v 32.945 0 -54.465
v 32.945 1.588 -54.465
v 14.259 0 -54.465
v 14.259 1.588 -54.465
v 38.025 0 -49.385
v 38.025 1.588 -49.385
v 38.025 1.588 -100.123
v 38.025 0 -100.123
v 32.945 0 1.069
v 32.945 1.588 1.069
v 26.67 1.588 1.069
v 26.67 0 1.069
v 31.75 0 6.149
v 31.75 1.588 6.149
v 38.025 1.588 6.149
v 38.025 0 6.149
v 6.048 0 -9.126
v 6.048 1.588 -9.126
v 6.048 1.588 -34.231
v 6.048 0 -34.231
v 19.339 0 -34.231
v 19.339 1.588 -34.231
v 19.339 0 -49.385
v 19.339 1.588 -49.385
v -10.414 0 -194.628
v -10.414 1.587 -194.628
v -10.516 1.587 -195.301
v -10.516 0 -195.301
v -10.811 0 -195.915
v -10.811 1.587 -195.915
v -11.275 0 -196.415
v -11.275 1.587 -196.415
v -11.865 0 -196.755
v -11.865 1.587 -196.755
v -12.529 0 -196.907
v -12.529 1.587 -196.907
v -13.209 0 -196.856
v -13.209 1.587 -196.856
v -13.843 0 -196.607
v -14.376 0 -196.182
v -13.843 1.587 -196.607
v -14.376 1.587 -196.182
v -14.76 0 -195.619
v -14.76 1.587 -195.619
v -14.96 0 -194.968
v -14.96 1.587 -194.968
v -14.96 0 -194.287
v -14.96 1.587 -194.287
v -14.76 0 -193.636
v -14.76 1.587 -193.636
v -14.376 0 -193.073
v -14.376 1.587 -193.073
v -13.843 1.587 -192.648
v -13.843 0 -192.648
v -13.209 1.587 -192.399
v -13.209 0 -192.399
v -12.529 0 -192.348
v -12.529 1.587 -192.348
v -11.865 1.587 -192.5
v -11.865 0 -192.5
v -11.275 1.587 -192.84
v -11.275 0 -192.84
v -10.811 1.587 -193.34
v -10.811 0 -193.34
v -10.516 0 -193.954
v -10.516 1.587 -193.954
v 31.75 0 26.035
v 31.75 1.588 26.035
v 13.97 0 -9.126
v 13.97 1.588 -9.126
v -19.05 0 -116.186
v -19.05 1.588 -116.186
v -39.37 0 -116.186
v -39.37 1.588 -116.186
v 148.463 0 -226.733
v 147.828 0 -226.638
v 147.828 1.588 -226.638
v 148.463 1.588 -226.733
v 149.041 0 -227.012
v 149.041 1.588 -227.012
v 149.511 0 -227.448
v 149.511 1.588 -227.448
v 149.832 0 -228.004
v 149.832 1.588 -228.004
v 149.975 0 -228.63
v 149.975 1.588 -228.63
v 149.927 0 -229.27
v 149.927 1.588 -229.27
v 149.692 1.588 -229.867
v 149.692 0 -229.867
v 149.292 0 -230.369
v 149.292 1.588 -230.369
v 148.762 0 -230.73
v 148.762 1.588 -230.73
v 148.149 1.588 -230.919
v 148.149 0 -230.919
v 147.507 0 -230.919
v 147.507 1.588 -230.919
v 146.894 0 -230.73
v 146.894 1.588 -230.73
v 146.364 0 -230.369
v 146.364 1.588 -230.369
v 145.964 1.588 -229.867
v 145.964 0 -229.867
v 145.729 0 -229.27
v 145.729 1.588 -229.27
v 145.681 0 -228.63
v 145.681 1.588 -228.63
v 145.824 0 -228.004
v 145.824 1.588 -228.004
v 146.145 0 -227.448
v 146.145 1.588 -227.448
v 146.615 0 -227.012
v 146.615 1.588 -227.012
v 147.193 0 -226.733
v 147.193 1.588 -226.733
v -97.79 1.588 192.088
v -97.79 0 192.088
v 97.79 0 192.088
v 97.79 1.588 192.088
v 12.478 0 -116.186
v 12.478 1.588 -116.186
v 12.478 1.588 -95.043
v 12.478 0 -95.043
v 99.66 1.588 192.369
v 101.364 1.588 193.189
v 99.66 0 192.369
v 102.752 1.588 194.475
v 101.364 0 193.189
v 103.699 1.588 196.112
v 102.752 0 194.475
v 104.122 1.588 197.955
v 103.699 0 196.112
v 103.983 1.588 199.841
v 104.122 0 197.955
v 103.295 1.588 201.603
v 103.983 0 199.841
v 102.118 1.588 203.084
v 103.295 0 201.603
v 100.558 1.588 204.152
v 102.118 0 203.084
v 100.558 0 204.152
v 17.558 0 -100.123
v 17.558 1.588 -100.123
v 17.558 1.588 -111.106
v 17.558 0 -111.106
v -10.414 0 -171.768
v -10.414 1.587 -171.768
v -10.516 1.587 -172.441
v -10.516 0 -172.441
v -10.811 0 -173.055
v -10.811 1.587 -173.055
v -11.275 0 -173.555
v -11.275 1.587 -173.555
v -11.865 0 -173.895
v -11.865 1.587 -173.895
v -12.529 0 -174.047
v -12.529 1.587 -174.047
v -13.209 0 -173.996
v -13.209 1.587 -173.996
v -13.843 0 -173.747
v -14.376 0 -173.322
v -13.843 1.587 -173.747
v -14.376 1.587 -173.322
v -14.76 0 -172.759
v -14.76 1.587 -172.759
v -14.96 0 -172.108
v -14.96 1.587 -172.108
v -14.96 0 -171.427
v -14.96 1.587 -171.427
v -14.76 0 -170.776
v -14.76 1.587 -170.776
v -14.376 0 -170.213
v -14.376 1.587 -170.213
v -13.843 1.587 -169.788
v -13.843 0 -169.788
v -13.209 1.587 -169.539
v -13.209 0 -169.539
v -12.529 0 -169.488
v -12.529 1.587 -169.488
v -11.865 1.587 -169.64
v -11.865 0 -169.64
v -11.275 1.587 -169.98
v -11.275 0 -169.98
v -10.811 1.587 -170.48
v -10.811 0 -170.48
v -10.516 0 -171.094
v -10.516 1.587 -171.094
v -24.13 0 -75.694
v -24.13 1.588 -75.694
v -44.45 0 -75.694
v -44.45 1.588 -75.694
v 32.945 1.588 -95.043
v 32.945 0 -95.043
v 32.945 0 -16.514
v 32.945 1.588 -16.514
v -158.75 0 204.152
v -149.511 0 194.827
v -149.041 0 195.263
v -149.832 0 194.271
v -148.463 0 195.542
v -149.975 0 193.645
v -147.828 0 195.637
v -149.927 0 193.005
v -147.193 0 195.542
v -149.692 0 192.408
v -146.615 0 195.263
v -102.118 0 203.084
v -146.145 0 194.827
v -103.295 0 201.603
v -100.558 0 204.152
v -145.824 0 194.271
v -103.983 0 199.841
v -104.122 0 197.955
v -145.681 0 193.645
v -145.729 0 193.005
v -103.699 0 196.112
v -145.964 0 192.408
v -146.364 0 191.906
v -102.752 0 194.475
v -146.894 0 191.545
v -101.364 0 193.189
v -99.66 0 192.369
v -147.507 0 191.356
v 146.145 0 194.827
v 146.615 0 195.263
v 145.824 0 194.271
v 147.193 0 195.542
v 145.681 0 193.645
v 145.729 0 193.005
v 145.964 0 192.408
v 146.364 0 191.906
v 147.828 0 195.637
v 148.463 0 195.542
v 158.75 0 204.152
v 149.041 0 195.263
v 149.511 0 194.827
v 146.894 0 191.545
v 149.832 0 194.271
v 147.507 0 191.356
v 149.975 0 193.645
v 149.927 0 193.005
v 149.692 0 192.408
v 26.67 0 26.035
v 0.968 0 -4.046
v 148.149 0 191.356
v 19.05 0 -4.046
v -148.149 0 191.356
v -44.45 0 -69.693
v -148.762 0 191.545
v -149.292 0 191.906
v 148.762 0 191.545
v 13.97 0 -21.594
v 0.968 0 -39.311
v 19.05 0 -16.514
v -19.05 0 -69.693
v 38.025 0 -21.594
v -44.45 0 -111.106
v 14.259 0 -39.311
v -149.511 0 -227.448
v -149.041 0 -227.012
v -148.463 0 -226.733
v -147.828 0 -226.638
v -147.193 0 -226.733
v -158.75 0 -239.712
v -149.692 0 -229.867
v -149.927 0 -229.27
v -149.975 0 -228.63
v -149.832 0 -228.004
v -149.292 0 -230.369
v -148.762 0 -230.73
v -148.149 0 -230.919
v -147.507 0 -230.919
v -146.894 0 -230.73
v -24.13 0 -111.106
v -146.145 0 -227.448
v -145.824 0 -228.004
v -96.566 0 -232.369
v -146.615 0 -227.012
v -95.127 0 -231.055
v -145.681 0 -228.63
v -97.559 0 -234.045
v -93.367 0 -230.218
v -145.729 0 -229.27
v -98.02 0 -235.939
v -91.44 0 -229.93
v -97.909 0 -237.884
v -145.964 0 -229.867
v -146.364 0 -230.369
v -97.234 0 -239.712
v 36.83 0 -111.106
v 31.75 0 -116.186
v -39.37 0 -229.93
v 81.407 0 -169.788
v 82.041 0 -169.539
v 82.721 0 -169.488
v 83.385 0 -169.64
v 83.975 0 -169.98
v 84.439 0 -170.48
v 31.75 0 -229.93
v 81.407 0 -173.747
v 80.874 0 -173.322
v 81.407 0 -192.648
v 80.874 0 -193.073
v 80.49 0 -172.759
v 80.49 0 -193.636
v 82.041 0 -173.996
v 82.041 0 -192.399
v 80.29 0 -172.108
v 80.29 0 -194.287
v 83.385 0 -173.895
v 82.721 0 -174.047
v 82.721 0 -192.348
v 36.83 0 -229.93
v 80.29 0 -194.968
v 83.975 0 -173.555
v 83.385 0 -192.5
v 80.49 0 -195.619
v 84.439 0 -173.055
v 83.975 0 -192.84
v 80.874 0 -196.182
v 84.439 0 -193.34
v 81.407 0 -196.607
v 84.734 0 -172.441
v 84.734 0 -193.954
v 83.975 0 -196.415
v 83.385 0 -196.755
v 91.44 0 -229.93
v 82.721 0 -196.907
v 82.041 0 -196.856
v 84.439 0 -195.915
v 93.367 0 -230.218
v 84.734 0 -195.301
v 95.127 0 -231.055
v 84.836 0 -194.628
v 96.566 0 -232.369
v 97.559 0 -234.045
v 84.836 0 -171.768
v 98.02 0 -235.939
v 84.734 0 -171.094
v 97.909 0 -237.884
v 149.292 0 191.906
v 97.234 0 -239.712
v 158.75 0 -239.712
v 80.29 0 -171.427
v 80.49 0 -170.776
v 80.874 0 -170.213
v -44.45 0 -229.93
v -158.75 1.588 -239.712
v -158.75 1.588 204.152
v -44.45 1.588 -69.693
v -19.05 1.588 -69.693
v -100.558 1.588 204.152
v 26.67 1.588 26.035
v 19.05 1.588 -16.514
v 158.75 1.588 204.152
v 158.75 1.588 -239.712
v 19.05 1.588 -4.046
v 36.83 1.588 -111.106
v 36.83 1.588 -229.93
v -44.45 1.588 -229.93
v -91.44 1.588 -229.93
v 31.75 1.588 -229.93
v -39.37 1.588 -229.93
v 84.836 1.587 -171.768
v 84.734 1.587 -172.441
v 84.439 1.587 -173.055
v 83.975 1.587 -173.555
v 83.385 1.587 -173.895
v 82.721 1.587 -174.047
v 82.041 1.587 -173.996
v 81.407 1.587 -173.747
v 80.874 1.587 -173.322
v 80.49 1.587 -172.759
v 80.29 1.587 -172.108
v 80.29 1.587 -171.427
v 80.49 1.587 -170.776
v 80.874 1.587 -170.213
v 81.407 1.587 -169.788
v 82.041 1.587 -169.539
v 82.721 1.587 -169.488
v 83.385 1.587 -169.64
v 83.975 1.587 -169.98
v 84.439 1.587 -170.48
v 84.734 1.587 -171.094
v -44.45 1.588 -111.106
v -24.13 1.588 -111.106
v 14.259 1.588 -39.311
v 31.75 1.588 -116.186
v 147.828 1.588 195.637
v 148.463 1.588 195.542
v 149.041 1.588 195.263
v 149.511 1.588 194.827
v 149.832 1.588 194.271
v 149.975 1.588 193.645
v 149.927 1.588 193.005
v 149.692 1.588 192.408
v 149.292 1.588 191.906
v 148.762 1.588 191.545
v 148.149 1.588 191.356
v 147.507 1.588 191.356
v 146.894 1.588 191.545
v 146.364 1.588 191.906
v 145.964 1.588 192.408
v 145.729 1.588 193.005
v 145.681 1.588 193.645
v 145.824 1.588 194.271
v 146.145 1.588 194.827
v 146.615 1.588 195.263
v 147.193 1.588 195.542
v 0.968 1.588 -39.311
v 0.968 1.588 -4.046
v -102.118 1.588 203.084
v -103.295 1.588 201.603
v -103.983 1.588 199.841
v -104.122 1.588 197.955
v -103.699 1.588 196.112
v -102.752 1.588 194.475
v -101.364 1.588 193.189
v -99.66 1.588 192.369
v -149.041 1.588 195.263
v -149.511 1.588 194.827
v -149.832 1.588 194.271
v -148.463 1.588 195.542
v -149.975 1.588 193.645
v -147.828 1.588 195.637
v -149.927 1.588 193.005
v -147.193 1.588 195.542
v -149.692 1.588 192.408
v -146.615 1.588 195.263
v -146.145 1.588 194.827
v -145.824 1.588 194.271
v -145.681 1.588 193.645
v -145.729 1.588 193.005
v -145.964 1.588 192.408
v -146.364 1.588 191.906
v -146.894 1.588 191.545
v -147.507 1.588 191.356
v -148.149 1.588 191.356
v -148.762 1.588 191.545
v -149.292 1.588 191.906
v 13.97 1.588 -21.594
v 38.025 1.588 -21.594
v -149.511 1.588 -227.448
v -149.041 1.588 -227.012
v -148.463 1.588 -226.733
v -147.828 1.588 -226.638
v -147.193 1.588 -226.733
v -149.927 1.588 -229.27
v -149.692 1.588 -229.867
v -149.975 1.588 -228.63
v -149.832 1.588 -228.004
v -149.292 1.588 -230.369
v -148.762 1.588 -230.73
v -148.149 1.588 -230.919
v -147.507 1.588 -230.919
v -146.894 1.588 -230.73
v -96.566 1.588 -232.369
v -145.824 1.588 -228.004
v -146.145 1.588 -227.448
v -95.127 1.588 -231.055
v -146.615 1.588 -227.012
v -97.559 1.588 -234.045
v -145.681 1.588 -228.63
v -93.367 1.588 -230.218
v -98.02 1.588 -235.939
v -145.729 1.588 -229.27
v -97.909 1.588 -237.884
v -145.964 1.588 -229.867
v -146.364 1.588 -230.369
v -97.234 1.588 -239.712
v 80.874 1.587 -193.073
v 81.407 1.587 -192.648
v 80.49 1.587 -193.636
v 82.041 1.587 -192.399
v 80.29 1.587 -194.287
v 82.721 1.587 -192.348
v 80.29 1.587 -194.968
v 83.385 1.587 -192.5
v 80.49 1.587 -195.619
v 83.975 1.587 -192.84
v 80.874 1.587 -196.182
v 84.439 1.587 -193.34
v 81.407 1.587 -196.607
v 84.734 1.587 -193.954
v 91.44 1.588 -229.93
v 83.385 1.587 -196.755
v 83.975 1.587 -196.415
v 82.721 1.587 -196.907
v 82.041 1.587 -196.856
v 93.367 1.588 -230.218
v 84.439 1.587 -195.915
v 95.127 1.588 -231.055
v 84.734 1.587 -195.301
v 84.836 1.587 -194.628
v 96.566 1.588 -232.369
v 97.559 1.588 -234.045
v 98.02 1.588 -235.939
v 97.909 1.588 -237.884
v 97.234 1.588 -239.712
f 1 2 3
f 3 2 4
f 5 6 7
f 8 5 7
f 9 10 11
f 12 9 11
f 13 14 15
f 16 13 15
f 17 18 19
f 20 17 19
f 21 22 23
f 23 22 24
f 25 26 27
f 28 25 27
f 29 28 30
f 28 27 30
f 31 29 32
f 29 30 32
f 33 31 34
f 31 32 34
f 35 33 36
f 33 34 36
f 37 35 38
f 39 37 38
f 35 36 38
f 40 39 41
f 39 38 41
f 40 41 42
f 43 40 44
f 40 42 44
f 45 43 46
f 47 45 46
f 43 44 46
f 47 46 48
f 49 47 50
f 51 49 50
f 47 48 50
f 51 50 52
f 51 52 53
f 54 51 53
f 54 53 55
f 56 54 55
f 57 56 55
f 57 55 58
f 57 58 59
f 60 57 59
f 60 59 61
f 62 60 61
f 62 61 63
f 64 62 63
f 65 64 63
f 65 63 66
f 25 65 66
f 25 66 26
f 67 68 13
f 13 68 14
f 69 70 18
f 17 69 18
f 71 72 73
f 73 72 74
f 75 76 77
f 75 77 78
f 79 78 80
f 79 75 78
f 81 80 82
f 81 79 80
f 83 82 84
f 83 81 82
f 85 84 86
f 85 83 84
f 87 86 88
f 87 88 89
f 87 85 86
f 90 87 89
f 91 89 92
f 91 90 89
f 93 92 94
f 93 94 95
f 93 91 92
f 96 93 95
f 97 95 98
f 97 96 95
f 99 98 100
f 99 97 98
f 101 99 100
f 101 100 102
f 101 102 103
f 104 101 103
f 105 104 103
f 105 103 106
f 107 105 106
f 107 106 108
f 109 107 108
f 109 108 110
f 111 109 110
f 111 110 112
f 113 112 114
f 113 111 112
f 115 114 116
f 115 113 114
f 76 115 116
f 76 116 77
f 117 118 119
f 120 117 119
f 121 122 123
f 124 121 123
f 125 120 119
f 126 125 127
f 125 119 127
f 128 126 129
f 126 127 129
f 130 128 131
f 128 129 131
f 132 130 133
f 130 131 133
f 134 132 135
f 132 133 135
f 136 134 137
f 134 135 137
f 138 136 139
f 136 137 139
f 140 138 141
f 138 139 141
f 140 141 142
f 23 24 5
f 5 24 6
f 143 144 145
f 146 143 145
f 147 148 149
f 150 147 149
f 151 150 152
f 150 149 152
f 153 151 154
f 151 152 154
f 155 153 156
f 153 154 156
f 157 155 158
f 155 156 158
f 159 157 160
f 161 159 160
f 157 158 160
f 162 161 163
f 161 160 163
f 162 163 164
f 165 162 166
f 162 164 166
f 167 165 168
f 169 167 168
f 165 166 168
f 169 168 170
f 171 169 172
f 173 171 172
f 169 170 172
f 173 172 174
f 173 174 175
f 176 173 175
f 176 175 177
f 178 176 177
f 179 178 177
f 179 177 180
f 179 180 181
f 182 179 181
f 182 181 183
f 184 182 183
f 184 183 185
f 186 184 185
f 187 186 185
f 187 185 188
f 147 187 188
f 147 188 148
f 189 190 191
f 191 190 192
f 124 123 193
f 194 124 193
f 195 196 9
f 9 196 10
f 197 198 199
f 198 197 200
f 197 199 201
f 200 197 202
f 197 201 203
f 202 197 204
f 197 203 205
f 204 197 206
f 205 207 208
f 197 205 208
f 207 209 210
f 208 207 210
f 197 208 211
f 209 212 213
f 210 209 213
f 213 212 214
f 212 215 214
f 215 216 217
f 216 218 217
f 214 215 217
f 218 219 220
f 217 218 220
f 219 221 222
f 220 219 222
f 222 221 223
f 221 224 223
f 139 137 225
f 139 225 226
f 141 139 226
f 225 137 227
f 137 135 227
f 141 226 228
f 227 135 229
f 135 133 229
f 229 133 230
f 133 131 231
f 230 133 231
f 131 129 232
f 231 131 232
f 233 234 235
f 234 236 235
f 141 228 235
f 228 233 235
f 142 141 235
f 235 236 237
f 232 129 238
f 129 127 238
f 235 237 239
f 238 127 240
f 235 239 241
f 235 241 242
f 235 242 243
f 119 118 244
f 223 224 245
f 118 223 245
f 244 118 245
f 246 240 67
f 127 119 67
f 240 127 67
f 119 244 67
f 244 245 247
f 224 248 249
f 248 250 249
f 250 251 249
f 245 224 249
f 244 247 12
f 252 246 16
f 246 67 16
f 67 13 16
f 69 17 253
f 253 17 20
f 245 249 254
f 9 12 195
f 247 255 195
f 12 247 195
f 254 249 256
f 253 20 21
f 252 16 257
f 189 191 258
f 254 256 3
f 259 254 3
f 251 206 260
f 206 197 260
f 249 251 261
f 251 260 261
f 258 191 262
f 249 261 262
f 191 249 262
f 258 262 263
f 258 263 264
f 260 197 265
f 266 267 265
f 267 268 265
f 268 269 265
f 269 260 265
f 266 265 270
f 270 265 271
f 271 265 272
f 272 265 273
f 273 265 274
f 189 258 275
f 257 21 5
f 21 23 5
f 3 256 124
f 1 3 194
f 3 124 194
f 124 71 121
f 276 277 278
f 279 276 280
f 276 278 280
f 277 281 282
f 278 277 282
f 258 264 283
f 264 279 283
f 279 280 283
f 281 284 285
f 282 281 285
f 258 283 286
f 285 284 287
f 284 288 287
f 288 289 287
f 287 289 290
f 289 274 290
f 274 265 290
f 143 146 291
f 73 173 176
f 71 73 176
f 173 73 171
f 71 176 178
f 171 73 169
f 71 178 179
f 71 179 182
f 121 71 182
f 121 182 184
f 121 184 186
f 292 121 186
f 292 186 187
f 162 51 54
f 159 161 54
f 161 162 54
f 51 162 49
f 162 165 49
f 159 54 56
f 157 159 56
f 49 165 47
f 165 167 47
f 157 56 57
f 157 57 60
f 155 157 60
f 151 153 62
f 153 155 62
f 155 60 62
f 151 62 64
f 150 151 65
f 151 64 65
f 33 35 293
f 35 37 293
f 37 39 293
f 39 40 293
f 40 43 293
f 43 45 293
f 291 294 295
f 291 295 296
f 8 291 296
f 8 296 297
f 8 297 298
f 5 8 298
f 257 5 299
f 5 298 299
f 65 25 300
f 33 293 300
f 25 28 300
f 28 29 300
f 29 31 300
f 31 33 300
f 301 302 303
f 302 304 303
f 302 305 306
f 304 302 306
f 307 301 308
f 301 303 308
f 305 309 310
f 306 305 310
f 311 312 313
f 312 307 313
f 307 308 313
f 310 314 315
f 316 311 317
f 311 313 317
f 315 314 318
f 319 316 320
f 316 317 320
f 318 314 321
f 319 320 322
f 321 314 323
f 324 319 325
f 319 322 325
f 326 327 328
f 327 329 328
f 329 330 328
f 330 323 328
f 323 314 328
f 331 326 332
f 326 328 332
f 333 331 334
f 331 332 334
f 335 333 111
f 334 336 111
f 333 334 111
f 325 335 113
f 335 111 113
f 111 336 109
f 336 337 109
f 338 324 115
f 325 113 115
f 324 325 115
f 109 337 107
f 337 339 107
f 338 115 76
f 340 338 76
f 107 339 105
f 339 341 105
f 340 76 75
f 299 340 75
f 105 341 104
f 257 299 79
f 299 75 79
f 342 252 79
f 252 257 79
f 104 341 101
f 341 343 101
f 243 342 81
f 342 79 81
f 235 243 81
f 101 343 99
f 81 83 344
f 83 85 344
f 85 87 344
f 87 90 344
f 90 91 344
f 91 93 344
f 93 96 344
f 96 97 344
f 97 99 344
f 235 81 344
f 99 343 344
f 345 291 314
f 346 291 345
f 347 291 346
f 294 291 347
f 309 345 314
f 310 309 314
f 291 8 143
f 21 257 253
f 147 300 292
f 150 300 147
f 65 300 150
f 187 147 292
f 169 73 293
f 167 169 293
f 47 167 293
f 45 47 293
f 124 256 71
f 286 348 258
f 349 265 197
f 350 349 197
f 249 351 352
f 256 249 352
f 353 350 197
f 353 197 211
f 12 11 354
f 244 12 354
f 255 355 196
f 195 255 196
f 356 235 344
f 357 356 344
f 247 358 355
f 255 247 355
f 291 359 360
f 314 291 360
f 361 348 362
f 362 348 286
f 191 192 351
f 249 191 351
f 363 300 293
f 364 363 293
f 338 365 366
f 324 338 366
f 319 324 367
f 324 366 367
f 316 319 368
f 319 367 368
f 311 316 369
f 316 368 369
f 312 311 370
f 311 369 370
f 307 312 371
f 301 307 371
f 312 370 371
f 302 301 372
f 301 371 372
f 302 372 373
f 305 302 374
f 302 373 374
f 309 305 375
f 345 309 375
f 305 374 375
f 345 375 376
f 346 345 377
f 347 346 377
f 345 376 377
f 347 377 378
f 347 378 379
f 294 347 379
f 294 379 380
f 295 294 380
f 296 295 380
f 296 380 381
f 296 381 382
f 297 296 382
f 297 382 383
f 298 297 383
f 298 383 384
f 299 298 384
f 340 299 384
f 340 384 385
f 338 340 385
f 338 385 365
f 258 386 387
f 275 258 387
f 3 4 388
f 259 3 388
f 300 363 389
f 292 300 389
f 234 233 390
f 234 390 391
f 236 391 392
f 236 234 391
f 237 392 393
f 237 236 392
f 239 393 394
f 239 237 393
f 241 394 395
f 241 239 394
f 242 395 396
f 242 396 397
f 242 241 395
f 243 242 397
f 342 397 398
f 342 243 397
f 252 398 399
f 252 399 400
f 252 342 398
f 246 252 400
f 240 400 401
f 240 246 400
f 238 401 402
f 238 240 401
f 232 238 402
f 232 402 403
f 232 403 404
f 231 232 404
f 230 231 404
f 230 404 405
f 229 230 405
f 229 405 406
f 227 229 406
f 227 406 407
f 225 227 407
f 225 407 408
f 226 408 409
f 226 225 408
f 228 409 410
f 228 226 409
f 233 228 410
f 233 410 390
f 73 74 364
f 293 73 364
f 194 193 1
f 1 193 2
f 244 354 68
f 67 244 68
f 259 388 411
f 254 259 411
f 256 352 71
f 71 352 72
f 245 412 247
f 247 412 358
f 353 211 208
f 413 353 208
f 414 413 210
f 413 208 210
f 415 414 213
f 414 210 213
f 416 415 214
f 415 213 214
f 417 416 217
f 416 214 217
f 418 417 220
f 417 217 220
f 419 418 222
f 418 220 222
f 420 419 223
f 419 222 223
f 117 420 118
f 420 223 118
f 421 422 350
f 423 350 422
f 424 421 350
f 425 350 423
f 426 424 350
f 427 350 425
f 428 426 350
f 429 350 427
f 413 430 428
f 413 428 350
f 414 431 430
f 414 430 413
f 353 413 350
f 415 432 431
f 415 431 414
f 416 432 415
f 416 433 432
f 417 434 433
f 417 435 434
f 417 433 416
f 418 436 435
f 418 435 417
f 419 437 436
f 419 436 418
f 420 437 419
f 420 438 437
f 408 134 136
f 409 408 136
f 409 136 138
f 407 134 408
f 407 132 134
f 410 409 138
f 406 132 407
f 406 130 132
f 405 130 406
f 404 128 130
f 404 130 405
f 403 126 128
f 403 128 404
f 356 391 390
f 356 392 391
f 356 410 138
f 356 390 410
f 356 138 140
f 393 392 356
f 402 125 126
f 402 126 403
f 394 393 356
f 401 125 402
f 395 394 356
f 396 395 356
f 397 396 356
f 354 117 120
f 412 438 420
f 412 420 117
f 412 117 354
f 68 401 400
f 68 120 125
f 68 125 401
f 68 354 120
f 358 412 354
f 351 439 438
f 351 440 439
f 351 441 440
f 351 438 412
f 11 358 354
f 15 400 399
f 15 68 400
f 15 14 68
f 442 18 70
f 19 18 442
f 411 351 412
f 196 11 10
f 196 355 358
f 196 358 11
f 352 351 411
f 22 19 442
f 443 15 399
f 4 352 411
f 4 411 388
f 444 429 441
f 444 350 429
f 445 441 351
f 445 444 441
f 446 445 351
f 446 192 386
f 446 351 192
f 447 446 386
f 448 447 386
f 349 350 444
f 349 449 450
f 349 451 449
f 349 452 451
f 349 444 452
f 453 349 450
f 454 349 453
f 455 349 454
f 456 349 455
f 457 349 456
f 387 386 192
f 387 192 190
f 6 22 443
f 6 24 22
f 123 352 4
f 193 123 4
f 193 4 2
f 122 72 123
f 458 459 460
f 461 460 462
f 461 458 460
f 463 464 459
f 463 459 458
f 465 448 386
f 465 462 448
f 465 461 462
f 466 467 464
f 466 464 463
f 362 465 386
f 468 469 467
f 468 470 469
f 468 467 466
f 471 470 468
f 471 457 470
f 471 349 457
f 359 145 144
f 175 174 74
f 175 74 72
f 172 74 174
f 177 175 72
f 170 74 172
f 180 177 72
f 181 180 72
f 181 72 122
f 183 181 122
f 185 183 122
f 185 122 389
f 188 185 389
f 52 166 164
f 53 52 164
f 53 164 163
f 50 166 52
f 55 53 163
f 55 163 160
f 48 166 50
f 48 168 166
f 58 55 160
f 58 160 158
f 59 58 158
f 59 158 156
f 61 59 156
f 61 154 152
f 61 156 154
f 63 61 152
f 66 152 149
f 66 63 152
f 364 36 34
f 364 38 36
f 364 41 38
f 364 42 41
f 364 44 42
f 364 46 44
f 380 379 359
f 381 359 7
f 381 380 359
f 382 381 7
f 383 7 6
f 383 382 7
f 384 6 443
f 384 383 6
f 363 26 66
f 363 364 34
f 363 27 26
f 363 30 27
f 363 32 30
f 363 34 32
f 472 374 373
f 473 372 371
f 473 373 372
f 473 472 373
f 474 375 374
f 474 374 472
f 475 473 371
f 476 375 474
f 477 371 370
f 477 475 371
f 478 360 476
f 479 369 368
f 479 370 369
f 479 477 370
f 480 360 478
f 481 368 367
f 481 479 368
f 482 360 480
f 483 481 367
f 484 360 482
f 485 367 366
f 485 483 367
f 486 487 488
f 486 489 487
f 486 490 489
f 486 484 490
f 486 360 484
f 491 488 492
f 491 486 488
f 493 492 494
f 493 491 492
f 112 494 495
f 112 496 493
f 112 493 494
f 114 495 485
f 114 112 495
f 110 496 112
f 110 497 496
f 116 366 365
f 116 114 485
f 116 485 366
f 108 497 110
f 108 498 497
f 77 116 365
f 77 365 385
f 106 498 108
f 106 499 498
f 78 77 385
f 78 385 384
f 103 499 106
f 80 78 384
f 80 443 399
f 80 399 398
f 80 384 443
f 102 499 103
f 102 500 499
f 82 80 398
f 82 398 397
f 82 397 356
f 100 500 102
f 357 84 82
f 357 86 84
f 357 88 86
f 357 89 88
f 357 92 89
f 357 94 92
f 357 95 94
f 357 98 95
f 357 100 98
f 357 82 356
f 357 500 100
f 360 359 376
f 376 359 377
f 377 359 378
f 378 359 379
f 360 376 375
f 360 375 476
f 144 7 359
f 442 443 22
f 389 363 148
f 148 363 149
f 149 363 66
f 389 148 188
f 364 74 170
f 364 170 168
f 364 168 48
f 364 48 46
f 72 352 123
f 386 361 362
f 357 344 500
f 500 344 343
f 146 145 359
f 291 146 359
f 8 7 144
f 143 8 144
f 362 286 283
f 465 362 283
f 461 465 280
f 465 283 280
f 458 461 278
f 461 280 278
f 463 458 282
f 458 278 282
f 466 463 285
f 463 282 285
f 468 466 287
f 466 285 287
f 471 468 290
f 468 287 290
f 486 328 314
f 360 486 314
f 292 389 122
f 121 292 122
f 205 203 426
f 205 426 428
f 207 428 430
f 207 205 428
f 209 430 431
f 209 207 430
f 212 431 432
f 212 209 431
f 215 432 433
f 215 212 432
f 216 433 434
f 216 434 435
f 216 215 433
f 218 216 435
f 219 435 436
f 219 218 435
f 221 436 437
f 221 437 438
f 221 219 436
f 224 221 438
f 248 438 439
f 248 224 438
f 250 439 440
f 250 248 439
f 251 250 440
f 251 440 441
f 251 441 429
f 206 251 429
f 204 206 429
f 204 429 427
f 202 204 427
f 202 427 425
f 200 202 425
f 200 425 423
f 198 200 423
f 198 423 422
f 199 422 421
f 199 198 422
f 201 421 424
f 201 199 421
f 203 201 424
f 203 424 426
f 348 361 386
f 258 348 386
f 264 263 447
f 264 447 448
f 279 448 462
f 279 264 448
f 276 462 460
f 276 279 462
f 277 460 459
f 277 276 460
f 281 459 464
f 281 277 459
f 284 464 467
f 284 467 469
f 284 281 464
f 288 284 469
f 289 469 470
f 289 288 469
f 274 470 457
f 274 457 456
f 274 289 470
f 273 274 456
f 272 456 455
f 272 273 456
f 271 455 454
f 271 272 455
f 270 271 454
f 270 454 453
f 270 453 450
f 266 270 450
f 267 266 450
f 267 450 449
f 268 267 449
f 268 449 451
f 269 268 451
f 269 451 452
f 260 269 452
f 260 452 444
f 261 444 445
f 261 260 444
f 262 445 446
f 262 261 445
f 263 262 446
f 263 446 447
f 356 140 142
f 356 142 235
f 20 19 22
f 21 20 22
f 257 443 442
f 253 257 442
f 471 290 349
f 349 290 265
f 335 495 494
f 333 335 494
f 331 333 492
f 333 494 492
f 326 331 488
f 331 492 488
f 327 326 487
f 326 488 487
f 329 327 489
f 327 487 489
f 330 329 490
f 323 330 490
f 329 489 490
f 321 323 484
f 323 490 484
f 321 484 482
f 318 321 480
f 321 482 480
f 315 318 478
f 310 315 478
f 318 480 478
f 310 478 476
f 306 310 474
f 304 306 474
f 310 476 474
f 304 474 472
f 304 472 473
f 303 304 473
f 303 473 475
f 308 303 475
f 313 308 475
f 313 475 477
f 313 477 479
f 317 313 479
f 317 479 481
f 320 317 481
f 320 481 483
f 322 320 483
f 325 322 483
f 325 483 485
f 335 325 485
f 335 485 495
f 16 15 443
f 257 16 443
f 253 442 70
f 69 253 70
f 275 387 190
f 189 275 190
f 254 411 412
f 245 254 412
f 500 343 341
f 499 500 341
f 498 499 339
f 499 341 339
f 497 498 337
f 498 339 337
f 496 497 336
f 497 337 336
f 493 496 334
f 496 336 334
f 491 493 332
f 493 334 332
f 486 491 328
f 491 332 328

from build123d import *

# Parameters (mm, degrees)
SKETCH1_R                     = 2.15265
SKETCH1_R_2                   = 9.525
SKETCH1_R_3                   = 2.4892
BOSS_EXTRUDE1_DEPTH           = 1.5875
CUT_EXTRUDE1_DEPTH            = 2.54
F_13_64_0_18_DIAMETER_HOLE1_D = 4.572
SKETCH7_W                     = 317.5
SKETCH7_H                     = 35.56
CUT_EXTRUDE2_DEPTH            = 288.517243505


with BuildPart() as part:
    # Sketch1 → Boss-Extrude1 (new body)
    # profile 1 of 21: a face of its own
    with BuildSketch(Plane(origin=(0, 0, 0), x_dir=(1, 0, 0), z_dir=(0, 1, 0))):
        with BuildLine():
            Line((-97.234377561, 239.7125), (-158.75, 239.7125))
            Line((-158.75, 239.7125), (-158.75, -239.7125))
            Line((-158.75, -239.7125), (158.75, -239.7125))
            Line((158.75, -239.7125), (158.75, 239.7125))
            Line((158.75, 239.7125), (97.234377561, 239.7125))
            ThreePointArc((97.234377561, 239.7125), (97.124777, 233.170194434), (91.44, 229.930273932))
            Line((91.44, 229.930273932), (-91.44, 229.930273932))
            ThreePointArc((-91.44, 229.930273932), (-97.124777, 233.170194434), (-97.234377561, 239.7125))
        make_face()
        with Locations(Location((-147.828, -193.4845, 0), (0, 0, 270))):
            Circle(SKETCH1_R, mode=Mode.SUBTRACT)
        with Locations((-104.14, -4.1275)):
            Circle(SKETCH1_R_2, mode=Mode.SUBTRACT)
        with BuildLine():
            ThreePointArc((-97.79, -204.7875), (-104.14, -198.4375), (-97.79, -192.0875))
            Line((-97.79, -192.0875), (97.79, -192.0875))
            ThreePointArc((97.79, -192.0875), (104.14, -198.4375), (97.79, -204.7875))
            Line((97.79, -204.7875), (-97.79, -204.7875))
        make_face(mode=Mode.SUBTRACT)
        with Locations(Location((147.828, -193.4845, 0), (0, 0, 270))):
            Circle(SKETCH1_R, mode=Mode.SUBTRACT)
        with Locations((104.14, -4.1275)):
            Circle(SKETCH1_R_2, mode=Mode.SUBTRACT)
        with Locations((-126.365, 30.1625)):
            Circle(SKETCH1_R, mode=Mode.SUBTRACT)
        with Locations((-126.365, 49.2125)):
            Circle(SKETCH1_R, mode=Mode.SUBTRACT)
        with Locations((-104.14, 40.0685)):
            Circle(SKETCH1_R_2, mode=Mode.SUBTRACT)
        with Locations((-104.14, 84.2645)):
            Circle(SKETCH1_R_3, mode=Mode.SUBTRACT)
        with Locations((-126.365, 163.5125)):
            Circle(SKETCH1_R, mode=Mode.SUBTRACT)
        with Locations((-126.365, 182.5625)):
            Circle(SKETCH1_R, mode=Mode.SUBTRACT)
        with Locations((-104.14, 128.4605)):
            Circle(SKETCH1_R_2, mode=Mode.SUBTRACT)
        with Locations((-104.14, 172.6565)):
            Circle(SKETCH1_R_2, mode=Mode.SUBTRACT)
        with Locations(Location((-147.828, 228.7905, 0), (0, 0, 270))):
            Circle(SKETCH1_R, mode=Mode.SUBTRACT)
        with Locations((-104.14, 216.8525)):
            Circle(SKETCH1_R_2, mode=Mode.SUBTRACT)
        with Locations((104.14, 40.0685)):
            Circle(SKETCH1_R_2, mode=Mode.SUBTRACT)
        with Locations((126.365, 30.1625)):
            Circle(SKETCH1_R, mode=Mode.SUBTRACT)
        with Locations((126.365, 49.2125)):
            Circle(SKETCH1_R, mode=Mode.SUBTRACT)
        with Locations((104.14, 84.2645)):
            Circle(SKETCH1_R_3, mode=Mode.SUBTRACT)
        with Locations((104.14, 128.4605)):
            Circle(SKETCH1_R_2, mode=Mode.SUBTRACT)
        with Locations((104.14, 172.6565)):
            Circle(SKETCH1_R_2, mode=Mode.SUBTRACT)
        with Locations((126.365, 163.5125)):
            Circle(SKETCH1_R, mode=Mode.SUBTRACT)
        with Locations((126.365, 182.5625)):
            Circle(SKETCH1_R, mode=Mode.SUBTRACT)
        with Locations((104.14, 216.8525)):
            Circle(SKETCH1_R_2, mode=Mode.SUBTRACT)
        with Locations(Location((147.828, 228.7905, 0), (0, 0, 270))):
            Circle(SKETCH1_R, mode=Mode.SUBTRACT)
    # profile 2 of 21: a face of its own
    with BuildSketch(Plane(origin=(0, 0, 0), x_dir=(1, 0, 0), z_dir=(0, 1, 0))):
        with Locations((-104.14, 216.8525)):
            Circle(SKETCH1_R_2)
    # profile 3 of 21: a face of its own
    with BuildSketch(Plane(origin=(0, 0, 0), x_dir=(1, 0, 0), z_dir=(0, 1, 0))):
        with Locations((-104.14, 172.6565)):
            Circle(SKETCH1_R_2)
    # profile 4 of 21: a face of its own
    with BuildSketch(Plane(origin=(0, 0, 0), x_dir=(1, 0, 0), z_dir=(0, 1, 0))):
        with Locations((-104.14, 128.4605)):
            Circle(SKETCH1_R_2)
    # profile 5 of 21: a face of its own
    with BuildSketch(Plane(origin=(0, 0, 0), x_dir=(1, 0, 0), z_dir=(0, 1, 0))):
        with Locations((-104.14, -4.1275)):
            Circle(SKETCH1_R_2)
    # profile 6 of 21: a face of its own
    with BuildSketch(Plane(origin=(0, 0, 0), x_dir=(1, 0, 0), z_dir=(0, 1, 0))):
        with Locations((-104.14, 40.0685)):
            Circle(SKETCH1_R_2)
    # profile 7 of 21: a face of its own
    with BuildSketch(Plane(origin=(0, 0, 0), x_dir=(1, 0, 0), z_dir=(0, 1, 0))):
        with Locations((104.14, 40.0685)):
            Circle(SKETCH1_R_2)
    # profile 8 of 21: a face of its own
    with BuildSketch(Plane(origin=(0, 0, 0), x_dir=(1, 0, 0), z_dir=(0, 1, 0))):
        with Locations((104.14, -4.1275)):
            Circle(SKETCH1_R_2)
    # profile 9 of 21: a face of its own
    with BuildSketch(Plane(origin=(0, 0, 0), x_dir=(1, 0, 0), z_dir=(0, 1, 0))):
        with Locations((104.14, 172.6565)):
            Circle(SKETCH1_R_2)
    # profile 10 of 21: a face of its own
    with BuildSketch(Plane(origin=(0, 0, 0), x_dir=(1, 0, 0), z_dir=(0, 1, 0))):
        with Locations((104.14, 216.8525)):
            Circle(SKETCH1_R_2)
    # profile 11 of 21: a face of its own
    with BuildSketch(Plane(origin=(0, 0, 0), x_dir=(1, 0, 0), z_dir=(0, 1, 0))):
        with Locations((104.14, 128.4605)):
            Circle(SKETCH1_R_2)
    # profile 12 of 21: a face of its own
    with BuildSketch(Plane(origin=(0, 0, 0), x_dir=(1, 0, 0), z_dir=(0, 1, 0))):
        with Locations((126.365, 30.1625)):
            Circle(SKETCH1_R)
    # profile 13 of 21: a face of its own
    with BuildSketch(Plane(origin=(0, 0, 0), x_dir=(1, 0, 0), z_dir=(0, 1, 0))):
        with Locations((126.365, 49.2125)):
            Circle(SKETCH1_R)
    # profile 14 of 21: a face of its own
    with BuildSketch(Plane(origin=(0, 0, 0), x_dir=(1, 0, 0), z_dir=(0, 1, 0))):
        with Locations((126.365, 163.5125)):
            Circle(SKETCH1_R)
    # profile 15 of 21: a face of its own
    with BuildSketch(Plane(origin=(0, 0, 0), x_dir=(1, 0, 0), z_dir=(0, 1, 0))):
        with Locations((126.365, 182.5625)):
            Circle(SKETCH1_R)
    # profile 16 of 21: a face of its own
    with BuildSketch(Plane(origin=(0, 0, 0), x_dir=(1, 0, 0), z_dir=(0, 1, 0))):
        with Locations((-126.365, 163.5125)):
            Circle(SKETCH1_R)
    # profile 17 of 21: a face of its own
    with BuildSketch(Plane(origin=(0, 0, 0), x_dir=(1, 0, 0), z_dir=(0, 1, 0))):
        with Locations((-126.365, 182.5625)):
            Circle(SKETCH1_R)
    # profile 18 of 21: a face of its own
    with BuildSketch(Plane(origin=(0, 0, 0), x_dir=(1, 0, 0), z_dir=(0, 1, 0))):
        with Locations((-126.365, 49.2125)):
            Circle(SKETCH1_R)
    # profile 19 of 21: a face of its own
    with BuildSketch(Plane(origin=(0, 0, 0), x_dir=(1, 0, 0), z_dir=(0, 1, 0))):
        with Locations((-126.365, 30.1625)):
            Circle(SKETCH1_R)
    # profile 20 of 21: a face of its own
    with BuildSketch(Plane(origin=(0, 0, 0), x_dir=(1, 0, 0), z_dir=(0, 1, 0))):
        with Locations((104.14, 84.2645)):
            Circle(SKETCH1_R_3)
    # profile 21 of 21: a face of its own
    with BuildSketch(Plane(origin=(0, 0, 0), x_dir=(1, 0, 0), z_dir=(0, 1, 0))):
        with Locations((-104.14, 84.2645)):
            Circle(SKETCH1_R_3)
    extrude(amount=BOSS_EXTRUDE1_DEPTH)

    # Sketch2 → Cut-Extrude1 (cut)
    with BuildSketch(Plane(origin=(0, 1.5875, 0), x_dir=(1, 0, 0), z_dir=(0, 1, 0))):
        Polygon((-39.37, 230.1875), (-44.45, 230.1875), (-44.45, 116.18638997), (-44.45, 111.10638997), (-39.37, 111.10638997), (-24.13, 111.10638997), (-24.13, 80.773994761), (-24.13, 75.693994761), (-44.45, 75.693994761), (-44.45, 69.693451711), (-19.05, 69.693451711), (-19.05, 75.693994761), (-19.05, 111.10638997), (-19.05, 116.18638997), (-39.37, 116.18638997), align=None)
        Polygon((36.83, 230.1875), (31.75, 230.1875), (31.75, 116.18638997), (12.478280381, 116.18638997), (12.478280381, 111.10638997), (12.478280381, 97.725538056), (12.478280381, 95.043026282), (27.466923788, 95.043026282), (32.944773159, 95.043026282), (32.944773159, 94.327747899), (32.944773159, 54.465469302), (19.338923788, 54.465469302), (14.258923788, 54.465469302), (14.258923788, 49.385469302), (14.258923788, 39.311344325), (6.047836395, 39.311344325), (0.967836395, 39.311344325), (0.967836395, 34.231344325), (0.967836395, 9.126281939), (0.967836395, 4.046281939), (6.047836395, 4.046281939), (13.97, 4.046281939), (19.05, 4.046281939), (19.05, 9.126281939), (19.05, 16.514356244), (32.944773159, 16.514356244), (32.944773159, -1.068708856), (26.67, -1.068708856), (26.67, -6.148708856), (26.67, -26.035), (31.75, -26.035), (31.75, -6.148708856), (32.944773159, -6.148708856), (38.024773159, -6.148708856), (38.024773159, -1.068708856), (38.024773159, 16.514356244), (38.024773159, 21.594356244), (19.05, 21.594356244), (13.97, 21.594356244), (13.97, 16.514356244), (13.97, 9.126281939), (6.047836395, 9.126281939), (6.047836395, 34.231344325), (14.258923788, 34.231344325), (19.338923788, 34.231344325), (19.338923788, 39.311344325), (19.338923788, 49.385469302), (38.024773159, 49.385469302), (38.024773159, 54.465469302), (38.024773159, 94.327747899), (38.024773159, 95.043026282), (38.024773159, 100.123026282), (19.090989095, 100.123026282), (17.558280381, 100.123026282), (17.558280381, 111.10638997), (36.83, 111.10638997), (36.83, 116.18638997), align=None)
    extrude(amount=-CUT_EXTRUDE1_DEPTH, mode=Mode.SUBTRACT)

    # 13/64 (0.18) Diameter Hole1 (through all)
    with Locations(Plane(origin=(0, 0, 0), x_dir=(-1, 0, 0), z_dir=(0, -1, 0))):
        with Locations((-82.55, 194.6275), (12.7, 194.6275), (-82.55, 171.7675), (12.7, 171.7675)):
            Hole(F_13_64_0_18_DIAMETER_HOLE1_D / 2)

    # Sketch7 → Cut-Extrude2 (cut, through all)
    with BuildSketch(Plane(origin=(0, 1.5875, 0), x_dir=(1, 0, 0), z_dir=(0, 1, 0))):
        with Locations((0, -221.9325)):
            Rectangle(SKETCH7_W, SKETCH7_H)
    extrude(amount=-CUT_EXTRUDE2_DEPTH, mode=Mode.SUBTRACT)


solid = part.part
